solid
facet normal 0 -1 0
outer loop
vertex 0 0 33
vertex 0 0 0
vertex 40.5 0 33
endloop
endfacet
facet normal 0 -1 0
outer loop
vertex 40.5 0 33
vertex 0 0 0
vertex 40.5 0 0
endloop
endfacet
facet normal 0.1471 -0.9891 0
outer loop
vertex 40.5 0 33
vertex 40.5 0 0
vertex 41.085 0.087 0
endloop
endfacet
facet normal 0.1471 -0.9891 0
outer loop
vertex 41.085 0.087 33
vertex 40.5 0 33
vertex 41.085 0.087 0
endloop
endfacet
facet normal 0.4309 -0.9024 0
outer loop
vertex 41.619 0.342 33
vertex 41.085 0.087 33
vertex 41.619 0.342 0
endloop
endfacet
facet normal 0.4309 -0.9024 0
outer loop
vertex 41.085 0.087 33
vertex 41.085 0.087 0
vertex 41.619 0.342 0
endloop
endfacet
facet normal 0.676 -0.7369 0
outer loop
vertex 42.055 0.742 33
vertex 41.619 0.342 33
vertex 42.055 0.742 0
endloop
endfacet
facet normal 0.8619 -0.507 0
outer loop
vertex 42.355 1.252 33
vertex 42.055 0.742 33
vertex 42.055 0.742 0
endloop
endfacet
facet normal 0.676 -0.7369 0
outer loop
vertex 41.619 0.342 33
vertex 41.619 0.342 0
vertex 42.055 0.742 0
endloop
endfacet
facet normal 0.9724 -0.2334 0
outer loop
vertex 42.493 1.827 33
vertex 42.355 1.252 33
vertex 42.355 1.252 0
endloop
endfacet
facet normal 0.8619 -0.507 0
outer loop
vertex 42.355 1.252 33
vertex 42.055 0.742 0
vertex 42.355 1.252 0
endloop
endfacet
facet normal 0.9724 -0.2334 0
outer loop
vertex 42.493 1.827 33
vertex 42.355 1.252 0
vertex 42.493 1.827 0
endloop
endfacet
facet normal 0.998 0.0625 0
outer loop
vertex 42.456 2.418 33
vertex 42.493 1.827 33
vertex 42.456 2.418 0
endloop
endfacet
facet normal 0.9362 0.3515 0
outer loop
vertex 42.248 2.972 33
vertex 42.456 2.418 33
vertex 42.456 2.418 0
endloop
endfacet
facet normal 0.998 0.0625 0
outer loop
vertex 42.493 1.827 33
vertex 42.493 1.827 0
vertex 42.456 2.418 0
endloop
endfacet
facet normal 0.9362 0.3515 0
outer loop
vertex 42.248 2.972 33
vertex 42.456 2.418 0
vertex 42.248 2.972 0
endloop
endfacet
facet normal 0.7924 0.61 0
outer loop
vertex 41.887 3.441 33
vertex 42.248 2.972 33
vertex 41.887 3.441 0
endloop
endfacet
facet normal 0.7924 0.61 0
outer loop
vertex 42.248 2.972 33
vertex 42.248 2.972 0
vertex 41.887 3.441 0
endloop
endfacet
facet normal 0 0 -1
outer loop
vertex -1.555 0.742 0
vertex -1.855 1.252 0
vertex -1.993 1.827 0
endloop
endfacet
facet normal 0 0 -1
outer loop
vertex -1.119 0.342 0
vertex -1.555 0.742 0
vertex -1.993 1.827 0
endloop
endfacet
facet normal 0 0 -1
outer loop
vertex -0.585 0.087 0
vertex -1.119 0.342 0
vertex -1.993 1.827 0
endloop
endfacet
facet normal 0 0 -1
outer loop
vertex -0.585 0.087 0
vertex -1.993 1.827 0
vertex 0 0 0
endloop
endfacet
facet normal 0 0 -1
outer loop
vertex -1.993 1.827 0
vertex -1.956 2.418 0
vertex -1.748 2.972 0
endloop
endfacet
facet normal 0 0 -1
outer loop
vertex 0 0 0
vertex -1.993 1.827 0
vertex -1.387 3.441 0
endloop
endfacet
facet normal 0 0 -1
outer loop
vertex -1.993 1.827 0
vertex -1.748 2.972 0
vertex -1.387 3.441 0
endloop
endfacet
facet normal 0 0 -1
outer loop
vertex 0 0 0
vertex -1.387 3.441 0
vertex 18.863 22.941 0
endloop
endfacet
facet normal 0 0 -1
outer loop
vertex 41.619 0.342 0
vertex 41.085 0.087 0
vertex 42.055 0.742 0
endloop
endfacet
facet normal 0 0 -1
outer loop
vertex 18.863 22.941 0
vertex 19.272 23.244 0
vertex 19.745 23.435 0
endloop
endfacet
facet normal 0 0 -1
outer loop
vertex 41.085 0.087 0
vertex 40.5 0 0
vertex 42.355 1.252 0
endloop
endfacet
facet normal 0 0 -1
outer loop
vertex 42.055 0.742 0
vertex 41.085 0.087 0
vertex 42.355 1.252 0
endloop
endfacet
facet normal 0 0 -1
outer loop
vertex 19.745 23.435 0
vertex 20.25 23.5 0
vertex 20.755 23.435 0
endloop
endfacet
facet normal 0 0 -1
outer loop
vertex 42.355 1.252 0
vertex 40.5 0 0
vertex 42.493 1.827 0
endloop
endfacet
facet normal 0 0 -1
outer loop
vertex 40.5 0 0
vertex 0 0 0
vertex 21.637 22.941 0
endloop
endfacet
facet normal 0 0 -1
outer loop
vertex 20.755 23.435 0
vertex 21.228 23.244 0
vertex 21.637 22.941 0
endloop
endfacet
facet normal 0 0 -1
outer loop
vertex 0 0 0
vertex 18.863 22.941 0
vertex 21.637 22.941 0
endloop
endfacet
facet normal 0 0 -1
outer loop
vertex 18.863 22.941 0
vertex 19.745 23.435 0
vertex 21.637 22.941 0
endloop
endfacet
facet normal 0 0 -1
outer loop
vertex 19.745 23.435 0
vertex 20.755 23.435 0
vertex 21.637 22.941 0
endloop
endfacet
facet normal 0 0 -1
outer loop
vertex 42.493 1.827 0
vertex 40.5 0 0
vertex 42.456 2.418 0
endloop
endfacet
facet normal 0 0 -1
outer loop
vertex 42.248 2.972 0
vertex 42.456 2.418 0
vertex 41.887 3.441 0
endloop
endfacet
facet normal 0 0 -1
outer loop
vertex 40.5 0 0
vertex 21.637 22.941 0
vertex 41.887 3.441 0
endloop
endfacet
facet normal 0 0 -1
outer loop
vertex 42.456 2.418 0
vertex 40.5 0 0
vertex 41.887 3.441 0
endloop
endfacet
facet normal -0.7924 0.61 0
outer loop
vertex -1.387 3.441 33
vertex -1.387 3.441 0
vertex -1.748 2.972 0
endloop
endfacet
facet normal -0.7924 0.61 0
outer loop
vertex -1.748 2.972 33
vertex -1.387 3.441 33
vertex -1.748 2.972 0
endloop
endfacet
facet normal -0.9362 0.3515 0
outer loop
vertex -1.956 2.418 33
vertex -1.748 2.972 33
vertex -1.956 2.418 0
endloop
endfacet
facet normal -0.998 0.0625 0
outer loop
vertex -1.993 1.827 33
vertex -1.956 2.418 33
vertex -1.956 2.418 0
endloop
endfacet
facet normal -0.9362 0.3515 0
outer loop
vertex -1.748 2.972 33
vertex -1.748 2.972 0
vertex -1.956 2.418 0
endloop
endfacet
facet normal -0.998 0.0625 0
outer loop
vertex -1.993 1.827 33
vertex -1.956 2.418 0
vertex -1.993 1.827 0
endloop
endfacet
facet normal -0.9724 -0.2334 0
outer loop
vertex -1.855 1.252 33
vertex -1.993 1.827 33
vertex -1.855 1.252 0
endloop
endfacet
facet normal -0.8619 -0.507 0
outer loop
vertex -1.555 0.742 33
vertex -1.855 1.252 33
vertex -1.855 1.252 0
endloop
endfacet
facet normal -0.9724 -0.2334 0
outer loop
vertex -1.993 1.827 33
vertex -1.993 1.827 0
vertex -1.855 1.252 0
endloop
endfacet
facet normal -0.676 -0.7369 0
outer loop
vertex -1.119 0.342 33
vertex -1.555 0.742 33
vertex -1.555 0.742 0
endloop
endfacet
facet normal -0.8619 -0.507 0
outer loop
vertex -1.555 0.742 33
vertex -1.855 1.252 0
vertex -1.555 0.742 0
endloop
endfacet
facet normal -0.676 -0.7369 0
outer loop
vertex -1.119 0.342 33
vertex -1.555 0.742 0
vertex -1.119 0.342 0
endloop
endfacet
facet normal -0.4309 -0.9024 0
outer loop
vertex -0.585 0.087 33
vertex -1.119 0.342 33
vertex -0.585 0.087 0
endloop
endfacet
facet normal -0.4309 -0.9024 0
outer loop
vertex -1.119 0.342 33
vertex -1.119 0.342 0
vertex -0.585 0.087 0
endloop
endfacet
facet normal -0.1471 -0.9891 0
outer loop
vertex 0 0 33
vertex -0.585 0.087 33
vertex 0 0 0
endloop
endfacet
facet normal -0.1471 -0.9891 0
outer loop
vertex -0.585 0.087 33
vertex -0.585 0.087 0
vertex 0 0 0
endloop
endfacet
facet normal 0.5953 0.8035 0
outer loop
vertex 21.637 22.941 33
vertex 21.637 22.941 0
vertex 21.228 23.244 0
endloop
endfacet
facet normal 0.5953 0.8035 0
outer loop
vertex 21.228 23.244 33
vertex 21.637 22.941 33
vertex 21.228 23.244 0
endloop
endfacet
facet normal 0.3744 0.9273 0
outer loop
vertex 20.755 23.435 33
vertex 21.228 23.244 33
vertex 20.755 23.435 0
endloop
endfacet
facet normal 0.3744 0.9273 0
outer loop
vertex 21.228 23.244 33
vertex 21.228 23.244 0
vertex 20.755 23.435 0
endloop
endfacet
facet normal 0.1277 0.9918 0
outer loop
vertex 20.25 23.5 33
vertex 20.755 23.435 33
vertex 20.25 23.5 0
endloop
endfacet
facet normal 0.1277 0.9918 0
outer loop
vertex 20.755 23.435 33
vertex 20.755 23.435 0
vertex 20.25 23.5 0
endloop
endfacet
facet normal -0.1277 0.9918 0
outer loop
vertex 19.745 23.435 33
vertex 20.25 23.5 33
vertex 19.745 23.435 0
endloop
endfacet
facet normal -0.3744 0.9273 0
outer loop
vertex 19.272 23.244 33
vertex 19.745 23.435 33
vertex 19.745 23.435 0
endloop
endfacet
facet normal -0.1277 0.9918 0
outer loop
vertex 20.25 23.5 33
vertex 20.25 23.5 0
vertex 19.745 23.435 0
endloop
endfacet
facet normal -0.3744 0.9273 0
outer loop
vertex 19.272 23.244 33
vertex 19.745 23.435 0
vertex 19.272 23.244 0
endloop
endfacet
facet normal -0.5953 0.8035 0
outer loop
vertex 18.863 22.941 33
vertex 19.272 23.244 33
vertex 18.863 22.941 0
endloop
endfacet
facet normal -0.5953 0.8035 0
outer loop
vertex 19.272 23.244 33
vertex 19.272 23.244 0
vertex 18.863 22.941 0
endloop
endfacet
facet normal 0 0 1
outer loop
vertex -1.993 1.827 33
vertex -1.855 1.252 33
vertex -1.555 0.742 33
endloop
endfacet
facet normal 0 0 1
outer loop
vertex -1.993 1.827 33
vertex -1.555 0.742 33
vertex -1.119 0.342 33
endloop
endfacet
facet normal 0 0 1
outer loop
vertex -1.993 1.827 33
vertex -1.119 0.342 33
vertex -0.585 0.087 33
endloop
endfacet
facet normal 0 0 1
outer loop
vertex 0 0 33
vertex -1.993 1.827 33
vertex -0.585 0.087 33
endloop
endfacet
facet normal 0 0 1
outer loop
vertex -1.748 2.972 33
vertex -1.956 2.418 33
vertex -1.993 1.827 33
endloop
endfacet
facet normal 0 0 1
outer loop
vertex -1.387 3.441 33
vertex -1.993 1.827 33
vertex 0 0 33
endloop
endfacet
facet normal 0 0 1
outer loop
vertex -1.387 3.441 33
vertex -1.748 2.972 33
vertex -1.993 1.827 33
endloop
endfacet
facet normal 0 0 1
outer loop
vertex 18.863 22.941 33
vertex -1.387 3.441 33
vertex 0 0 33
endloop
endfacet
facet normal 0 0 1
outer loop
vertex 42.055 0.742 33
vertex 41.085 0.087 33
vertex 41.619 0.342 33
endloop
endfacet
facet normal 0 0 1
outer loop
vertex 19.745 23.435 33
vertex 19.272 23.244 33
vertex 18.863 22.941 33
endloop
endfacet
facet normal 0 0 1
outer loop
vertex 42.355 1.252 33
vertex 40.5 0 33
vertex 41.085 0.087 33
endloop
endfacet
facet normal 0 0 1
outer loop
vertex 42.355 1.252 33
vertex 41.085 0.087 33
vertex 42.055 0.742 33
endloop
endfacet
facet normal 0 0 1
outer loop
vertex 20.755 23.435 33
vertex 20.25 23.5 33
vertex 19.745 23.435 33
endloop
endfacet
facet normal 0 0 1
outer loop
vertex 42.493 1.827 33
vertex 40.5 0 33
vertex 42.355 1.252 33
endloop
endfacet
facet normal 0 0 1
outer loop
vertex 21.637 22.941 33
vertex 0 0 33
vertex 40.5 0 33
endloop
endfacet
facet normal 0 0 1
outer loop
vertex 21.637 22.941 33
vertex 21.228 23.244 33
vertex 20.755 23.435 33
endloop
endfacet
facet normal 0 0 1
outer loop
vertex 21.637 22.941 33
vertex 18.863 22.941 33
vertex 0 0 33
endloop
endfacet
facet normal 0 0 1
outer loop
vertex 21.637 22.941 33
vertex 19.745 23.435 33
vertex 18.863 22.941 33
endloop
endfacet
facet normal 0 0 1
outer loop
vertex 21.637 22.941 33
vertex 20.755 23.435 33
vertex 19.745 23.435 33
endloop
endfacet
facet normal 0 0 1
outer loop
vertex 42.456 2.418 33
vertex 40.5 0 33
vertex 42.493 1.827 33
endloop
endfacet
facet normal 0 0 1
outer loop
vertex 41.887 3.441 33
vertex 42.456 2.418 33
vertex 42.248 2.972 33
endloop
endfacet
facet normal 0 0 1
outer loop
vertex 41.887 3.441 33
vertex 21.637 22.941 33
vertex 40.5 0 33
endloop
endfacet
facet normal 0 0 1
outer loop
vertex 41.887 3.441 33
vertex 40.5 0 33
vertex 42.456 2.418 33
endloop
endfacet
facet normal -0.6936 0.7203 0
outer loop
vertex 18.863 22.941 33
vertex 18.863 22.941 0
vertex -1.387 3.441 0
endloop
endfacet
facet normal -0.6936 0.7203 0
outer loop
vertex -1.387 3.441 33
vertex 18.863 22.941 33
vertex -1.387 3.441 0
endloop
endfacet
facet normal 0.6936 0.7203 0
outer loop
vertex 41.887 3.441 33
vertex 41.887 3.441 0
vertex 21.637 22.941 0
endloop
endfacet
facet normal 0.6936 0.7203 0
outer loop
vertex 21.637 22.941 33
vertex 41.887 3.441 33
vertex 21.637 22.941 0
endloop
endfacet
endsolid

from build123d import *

# Parameters (mm, degrees)
EXTRUDE1_DEPTH = 33


with BuildPart() as part:
    # Sketch1 → Extrude1 (new body)
    with BuildSketch(Plane.XY):
        with BuildLine():
            Line((0, 0), (40.5, 0))
            ThreePointArc((40.5, 0), (42.354896339, 1.252096548), (41.887283374, 3.440640427))
            Line((41.887283374, 3.440640427), (21.637283374, 22.940640427))
            ThreePointArc((21.637283374, 22.940640427), (20.25, 23.5), (18.862716626, 22.940640427))
            Line((18.862716626, 22.940640427), (-1.387283374, 3.440640427))
            ThreePointArc((-1.387283374, 3.440640427), (-1.854896339, 1.252096548), (0, 0))
        make_face()
    extrude(amount=EXTRUDE1_DEPTH)


solid = part.part
